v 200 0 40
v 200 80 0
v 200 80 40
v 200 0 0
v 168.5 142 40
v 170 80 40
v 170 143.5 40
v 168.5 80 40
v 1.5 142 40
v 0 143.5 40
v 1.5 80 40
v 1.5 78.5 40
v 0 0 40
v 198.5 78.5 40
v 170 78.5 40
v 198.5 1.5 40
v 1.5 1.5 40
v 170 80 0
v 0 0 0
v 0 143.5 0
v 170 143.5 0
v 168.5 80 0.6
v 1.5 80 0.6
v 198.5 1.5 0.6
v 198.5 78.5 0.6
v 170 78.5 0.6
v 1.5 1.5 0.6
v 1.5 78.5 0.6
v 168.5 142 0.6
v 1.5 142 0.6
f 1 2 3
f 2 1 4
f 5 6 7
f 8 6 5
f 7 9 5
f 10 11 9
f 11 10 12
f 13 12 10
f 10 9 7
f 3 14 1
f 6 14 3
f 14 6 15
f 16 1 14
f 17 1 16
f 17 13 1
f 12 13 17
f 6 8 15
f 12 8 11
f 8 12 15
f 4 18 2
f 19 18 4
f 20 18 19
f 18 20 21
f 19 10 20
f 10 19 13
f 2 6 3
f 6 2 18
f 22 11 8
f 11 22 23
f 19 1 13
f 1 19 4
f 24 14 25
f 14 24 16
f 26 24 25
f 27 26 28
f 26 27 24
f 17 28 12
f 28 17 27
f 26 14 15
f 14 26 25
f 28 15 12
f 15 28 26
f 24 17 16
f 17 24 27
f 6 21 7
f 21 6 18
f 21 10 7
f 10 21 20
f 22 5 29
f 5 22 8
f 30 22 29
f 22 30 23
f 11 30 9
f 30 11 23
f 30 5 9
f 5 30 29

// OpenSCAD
//cube([200,80,40]);
//cube([160,60,40]);
l=200;
w=80;
l2=170;
w2=65;
h=40;
wall=1.5;
difference() {
    cube([l,w,h]);
    translate([wall,wall,.6]) cube([l-wall*2,w-wall*2,h]);
}
translate([0,w-wall,0]) difference() {
    cube([l2,w2,h]);
    translate([wall,wall,.6]) cube([l2-wall*2,w2-wall*2,h]);
}
